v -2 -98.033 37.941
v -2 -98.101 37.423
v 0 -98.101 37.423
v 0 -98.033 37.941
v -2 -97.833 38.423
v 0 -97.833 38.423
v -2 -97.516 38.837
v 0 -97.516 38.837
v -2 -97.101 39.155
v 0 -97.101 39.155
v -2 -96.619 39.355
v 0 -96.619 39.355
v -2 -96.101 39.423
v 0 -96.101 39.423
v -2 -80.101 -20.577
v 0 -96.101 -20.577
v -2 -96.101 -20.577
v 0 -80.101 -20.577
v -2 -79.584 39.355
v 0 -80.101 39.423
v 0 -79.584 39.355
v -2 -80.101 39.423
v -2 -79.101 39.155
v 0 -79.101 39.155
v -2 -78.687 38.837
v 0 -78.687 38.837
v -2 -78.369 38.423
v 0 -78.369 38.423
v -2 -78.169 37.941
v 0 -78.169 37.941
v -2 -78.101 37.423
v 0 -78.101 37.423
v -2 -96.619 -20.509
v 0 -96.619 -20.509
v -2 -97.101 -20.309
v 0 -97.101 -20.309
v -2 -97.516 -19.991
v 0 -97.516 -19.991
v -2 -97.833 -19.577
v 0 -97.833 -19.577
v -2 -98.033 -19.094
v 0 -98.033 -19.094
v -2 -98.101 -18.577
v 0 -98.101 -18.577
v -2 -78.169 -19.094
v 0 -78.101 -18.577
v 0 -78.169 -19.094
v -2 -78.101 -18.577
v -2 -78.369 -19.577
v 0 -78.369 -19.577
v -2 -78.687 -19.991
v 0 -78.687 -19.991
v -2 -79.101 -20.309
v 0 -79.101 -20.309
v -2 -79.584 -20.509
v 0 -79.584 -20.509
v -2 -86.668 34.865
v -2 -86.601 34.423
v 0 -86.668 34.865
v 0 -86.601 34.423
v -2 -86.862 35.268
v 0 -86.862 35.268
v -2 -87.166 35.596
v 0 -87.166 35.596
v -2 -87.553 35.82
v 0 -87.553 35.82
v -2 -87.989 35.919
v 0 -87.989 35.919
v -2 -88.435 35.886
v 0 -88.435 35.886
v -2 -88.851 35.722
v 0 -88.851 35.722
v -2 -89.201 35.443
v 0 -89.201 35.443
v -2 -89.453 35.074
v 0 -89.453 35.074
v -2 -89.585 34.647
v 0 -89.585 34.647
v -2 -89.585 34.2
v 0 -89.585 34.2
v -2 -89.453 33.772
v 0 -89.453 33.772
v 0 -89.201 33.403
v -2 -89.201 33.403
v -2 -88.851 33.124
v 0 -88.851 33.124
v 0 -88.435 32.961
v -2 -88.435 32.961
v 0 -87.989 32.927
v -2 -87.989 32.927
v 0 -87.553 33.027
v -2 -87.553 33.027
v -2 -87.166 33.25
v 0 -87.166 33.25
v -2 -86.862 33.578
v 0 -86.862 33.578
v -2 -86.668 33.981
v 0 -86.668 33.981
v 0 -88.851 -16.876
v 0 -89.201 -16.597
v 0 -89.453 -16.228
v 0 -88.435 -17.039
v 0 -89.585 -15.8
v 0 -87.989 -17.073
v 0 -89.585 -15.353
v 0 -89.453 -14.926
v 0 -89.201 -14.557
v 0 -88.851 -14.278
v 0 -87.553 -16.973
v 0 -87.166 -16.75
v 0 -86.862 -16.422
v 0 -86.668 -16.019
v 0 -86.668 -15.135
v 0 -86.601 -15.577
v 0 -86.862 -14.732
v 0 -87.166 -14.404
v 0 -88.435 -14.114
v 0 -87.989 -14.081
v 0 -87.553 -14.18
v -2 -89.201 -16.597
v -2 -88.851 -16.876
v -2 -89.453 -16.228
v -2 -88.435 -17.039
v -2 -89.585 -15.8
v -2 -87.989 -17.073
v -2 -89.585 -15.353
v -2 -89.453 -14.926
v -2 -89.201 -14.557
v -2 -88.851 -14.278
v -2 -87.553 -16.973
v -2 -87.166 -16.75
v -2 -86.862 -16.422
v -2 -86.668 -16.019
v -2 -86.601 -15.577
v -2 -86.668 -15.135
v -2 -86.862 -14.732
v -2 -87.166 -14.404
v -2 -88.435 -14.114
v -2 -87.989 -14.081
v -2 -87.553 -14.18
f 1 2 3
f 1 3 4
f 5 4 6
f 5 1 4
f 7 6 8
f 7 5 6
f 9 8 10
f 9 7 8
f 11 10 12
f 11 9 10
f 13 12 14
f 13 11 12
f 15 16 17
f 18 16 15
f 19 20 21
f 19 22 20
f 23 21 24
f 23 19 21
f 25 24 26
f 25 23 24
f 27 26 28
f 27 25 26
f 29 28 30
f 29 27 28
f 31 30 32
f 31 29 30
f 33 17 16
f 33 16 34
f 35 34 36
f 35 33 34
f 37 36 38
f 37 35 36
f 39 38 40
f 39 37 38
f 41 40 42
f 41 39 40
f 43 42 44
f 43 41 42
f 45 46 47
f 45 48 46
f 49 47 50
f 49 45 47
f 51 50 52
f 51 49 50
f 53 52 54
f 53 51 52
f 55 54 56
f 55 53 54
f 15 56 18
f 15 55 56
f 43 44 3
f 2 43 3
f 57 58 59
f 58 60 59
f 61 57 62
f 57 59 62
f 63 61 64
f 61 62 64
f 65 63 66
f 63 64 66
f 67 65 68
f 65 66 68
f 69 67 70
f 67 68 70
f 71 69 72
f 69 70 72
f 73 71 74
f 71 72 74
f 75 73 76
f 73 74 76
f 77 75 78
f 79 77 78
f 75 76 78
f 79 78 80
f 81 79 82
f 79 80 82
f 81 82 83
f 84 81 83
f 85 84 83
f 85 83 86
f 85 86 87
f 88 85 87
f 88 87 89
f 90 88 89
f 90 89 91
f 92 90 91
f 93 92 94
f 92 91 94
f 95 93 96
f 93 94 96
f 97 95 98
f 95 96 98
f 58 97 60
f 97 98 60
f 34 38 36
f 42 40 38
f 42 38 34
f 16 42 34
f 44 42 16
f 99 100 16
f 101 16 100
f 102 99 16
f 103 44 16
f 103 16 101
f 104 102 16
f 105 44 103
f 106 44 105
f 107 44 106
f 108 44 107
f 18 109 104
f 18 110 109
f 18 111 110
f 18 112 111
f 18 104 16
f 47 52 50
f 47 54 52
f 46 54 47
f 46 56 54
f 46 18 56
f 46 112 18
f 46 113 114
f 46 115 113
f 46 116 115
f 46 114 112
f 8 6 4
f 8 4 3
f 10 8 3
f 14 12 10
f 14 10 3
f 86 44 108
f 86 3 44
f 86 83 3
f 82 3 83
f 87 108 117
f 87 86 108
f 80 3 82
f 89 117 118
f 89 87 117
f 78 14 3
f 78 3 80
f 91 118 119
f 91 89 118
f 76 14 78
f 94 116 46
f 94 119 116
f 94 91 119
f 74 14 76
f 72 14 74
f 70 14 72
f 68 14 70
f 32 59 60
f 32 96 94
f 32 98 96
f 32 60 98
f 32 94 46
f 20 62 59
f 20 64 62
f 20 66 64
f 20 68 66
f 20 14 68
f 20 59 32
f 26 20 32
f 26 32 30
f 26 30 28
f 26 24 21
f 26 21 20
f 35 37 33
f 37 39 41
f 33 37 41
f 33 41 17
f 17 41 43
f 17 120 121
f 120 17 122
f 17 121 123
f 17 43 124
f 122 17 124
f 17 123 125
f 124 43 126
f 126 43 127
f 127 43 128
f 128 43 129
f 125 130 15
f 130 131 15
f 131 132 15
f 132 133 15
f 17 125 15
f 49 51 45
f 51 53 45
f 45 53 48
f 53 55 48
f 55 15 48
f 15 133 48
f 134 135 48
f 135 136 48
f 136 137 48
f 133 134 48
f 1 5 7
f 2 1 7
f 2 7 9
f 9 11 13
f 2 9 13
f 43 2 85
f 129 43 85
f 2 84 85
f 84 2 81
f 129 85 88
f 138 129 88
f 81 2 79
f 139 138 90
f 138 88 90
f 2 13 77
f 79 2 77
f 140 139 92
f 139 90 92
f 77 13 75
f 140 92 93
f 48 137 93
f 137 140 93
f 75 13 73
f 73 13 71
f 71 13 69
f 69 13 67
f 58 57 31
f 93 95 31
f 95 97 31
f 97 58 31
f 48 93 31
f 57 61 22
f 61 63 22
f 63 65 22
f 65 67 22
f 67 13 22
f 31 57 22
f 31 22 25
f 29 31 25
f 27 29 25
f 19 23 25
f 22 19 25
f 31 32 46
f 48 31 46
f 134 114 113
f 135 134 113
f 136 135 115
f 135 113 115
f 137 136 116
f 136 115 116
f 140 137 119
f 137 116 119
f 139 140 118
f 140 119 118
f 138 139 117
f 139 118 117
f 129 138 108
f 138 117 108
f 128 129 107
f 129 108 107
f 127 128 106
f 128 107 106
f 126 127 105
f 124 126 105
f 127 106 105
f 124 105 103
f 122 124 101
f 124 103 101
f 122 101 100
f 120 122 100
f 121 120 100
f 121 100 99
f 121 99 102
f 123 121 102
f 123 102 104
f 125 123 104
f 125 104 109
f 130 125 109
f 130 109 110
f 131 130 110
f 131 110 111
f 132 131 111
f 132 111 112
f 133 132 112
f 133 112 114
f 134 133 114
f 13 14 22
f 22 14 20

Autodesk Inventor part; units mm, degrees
ref_plane "YZ Plane" through (0, 0, 0) normal (1, 0, 0) x (0, 1, 0)
ref_plane "XZ Plane" through (0, 0, 0) normal (0, 1, 0) x (-1, 0, 0)
ref_plane "XY Plane" through (0, 0, 0) normal (0, 0, 1) x (1, 0, 0)
sketch "スケッチ1" plane through (0, 0, 0) normal (1, 0, 0) x (0, 1, 0)
  line L0 (-78.1013, 9.4232) -> (-98.1013, 9.4232)
  line L1 (-98.1013, 9.4232) -> (-78.1013, 9.4232)
  line L2 (-78.1013, 9.4232) -> (-78.1013, -630.5768)
  line L3 (-78.1013, -630.5768) -> (-98.1013, -630.5768)
  line L4 (-98.1013, -630.5768) -> (-98.1013, 9.4232)
  line L5 (90.8987, -620.5768) -> (110.8987, -620.5768)
  line L6 (110.8987, -620.5768) -> (110.8987, -53.5768)
  line L7 (110.8987, -53.5768) -> (90.8987, -53.5768)
  line L8 (90.8987, -53.5768) -> (90.8987, -620.5768)
  line L9 (90.8987, 19.4232) -> (90.8987, 586.4232)
  line L10 (-73.5639, 640.5027) -> (90.8987, -49.1588)
  line L11 (90.8987, -49.1588) -> (110.3532, -44.5196)
  line L12 (110.3532, -44.5196) -> (-54.1094, 645.142)
  line L13 (-54.1094, 645.142) -> (-73.5639, 640.5027)
  line L14 (-78.1013, 644.9232) -> (-78.1013, 9.4232)
  circle A0 centre (-88.1013, 639.9232) radius 1.5
  circle A1 centre (-88.1013, 639.9232) radius 1.5
  circle A2 centre (-88.1013, 629.9232) radius 1.5
  circle A3 centre (-88.1013, 629.9232) radius 1.5
  line L15 (-98.1013, 9.4232) -> (-98.1013, 644.9232)
  line L16 (-98.1013, 624.9232) -> (-78.1013, 624.9232)
  line L17 (-78.1013, 624.9232) -> (-67.7648, 616.1846)
  line L18 (-67.7648, 616.1846) -> (-48.3103, 620.8239)
  line L19 (-78.1013, 644.9232) -> (-54.1094, 645.142)
  circle A4 centre (-61.517, 633.0951) radius 1.5
  circle A5 centre (-59.1973, 623.3679) radius 1.5
  line L20 (-78.1013, 644.9232) -> (-98.1013, 644.9232)
  line L21 (-78.1013, 644.9232) -> (-98.1013, 644.9232)
  line L22 (-98.1013, 644.9232) -> (-98.1013, 624.9232)
  line L23 (-98.1013, -20.5768) -> (-78.1013, -20.5768)
  circle A6 centre (-88.1013, -15.5768) radius 1.5
  line L24 (-98.1013, 39.4232) -> (-78.1013, 39.4232)
  circle A7 centre (-88.1013, 34.4232) radius 1.5
  line L25 (-98.1013, 39.4232) -> (-98.1013, 8.2286)
  line L26 (-78.1013, 39.4232) -> (-78.1013, 9.4232)
  point P0 (0, 0)
  point P1 (-78.1013, 19.4232)
  point P2 (-88.1013, -605.5768)
  point P3 (100.8987, -605.5768)
  point P4 (100.8987, -58.5768)
  point P5 (100.8987, -68.5768)
  point P6 (100.8987, -620.5768)
  point P7 (98.3063, -37.112)
  point P8 (95.9867, -27.3847)
  point P9 (-58.0375, 618.5042)
  dimension "d0" = 20
  dimension "d1" = 640
  dimension "d2" = 20
  dimension "d3" = 567
  dimension "d4" = 10
  dimension "d5" = 0
  dimension "d6" = 25
  dimension "d7" = 15
  dimension "d8" = 10
  dimension "d9" = 10
  dimension "d10" = 5
  dimension "d11" = 10
  dimension "d12" = 10
  dimension "d13" = 10
  dimension "d14" = 20
  dimension "d15" = 709
  dimension "d16" = 4.4179
  dimension "d17" = 4.5374
  dimension "d18" = 10
  dimension "d19" = 10
  dimension "d20" = 10
  dimension "d21" = 10
  dimension "d22" = 10
  dimension "d23" = 10
  dimension "d24" = 10
  dimension "d25" = 10
  dimension "d26" = 25
  dimension "d27" = 10
  dimension "d28" = 3
  dimension "d29" = 3
  dimension "d30" = 5
  dimension "d31" = 5
  dimension "d32" = 3
  dimension "d33" = 3
  dimension "d34" = 5
  dimension "d35" = 3
  dimension "d36" = 5
extrude "押し出し1" add sketch "スケッチ1" against normal blind 2 contours L2 L23 L4 L0 | L0 L15 L24 L14
fillet "フィレット1" radius 2 4 edges at (-1, -78.1013, 39.4232) (-1, -98.1013, 39.4232) (-1, -98.1013, -20.5768) (-1, -78.1013, -20.5768)
equation "\"d21\" = d20"
properties part number "base_weel-v1-Plate-expand-1" material "アルミニウム 6061"
